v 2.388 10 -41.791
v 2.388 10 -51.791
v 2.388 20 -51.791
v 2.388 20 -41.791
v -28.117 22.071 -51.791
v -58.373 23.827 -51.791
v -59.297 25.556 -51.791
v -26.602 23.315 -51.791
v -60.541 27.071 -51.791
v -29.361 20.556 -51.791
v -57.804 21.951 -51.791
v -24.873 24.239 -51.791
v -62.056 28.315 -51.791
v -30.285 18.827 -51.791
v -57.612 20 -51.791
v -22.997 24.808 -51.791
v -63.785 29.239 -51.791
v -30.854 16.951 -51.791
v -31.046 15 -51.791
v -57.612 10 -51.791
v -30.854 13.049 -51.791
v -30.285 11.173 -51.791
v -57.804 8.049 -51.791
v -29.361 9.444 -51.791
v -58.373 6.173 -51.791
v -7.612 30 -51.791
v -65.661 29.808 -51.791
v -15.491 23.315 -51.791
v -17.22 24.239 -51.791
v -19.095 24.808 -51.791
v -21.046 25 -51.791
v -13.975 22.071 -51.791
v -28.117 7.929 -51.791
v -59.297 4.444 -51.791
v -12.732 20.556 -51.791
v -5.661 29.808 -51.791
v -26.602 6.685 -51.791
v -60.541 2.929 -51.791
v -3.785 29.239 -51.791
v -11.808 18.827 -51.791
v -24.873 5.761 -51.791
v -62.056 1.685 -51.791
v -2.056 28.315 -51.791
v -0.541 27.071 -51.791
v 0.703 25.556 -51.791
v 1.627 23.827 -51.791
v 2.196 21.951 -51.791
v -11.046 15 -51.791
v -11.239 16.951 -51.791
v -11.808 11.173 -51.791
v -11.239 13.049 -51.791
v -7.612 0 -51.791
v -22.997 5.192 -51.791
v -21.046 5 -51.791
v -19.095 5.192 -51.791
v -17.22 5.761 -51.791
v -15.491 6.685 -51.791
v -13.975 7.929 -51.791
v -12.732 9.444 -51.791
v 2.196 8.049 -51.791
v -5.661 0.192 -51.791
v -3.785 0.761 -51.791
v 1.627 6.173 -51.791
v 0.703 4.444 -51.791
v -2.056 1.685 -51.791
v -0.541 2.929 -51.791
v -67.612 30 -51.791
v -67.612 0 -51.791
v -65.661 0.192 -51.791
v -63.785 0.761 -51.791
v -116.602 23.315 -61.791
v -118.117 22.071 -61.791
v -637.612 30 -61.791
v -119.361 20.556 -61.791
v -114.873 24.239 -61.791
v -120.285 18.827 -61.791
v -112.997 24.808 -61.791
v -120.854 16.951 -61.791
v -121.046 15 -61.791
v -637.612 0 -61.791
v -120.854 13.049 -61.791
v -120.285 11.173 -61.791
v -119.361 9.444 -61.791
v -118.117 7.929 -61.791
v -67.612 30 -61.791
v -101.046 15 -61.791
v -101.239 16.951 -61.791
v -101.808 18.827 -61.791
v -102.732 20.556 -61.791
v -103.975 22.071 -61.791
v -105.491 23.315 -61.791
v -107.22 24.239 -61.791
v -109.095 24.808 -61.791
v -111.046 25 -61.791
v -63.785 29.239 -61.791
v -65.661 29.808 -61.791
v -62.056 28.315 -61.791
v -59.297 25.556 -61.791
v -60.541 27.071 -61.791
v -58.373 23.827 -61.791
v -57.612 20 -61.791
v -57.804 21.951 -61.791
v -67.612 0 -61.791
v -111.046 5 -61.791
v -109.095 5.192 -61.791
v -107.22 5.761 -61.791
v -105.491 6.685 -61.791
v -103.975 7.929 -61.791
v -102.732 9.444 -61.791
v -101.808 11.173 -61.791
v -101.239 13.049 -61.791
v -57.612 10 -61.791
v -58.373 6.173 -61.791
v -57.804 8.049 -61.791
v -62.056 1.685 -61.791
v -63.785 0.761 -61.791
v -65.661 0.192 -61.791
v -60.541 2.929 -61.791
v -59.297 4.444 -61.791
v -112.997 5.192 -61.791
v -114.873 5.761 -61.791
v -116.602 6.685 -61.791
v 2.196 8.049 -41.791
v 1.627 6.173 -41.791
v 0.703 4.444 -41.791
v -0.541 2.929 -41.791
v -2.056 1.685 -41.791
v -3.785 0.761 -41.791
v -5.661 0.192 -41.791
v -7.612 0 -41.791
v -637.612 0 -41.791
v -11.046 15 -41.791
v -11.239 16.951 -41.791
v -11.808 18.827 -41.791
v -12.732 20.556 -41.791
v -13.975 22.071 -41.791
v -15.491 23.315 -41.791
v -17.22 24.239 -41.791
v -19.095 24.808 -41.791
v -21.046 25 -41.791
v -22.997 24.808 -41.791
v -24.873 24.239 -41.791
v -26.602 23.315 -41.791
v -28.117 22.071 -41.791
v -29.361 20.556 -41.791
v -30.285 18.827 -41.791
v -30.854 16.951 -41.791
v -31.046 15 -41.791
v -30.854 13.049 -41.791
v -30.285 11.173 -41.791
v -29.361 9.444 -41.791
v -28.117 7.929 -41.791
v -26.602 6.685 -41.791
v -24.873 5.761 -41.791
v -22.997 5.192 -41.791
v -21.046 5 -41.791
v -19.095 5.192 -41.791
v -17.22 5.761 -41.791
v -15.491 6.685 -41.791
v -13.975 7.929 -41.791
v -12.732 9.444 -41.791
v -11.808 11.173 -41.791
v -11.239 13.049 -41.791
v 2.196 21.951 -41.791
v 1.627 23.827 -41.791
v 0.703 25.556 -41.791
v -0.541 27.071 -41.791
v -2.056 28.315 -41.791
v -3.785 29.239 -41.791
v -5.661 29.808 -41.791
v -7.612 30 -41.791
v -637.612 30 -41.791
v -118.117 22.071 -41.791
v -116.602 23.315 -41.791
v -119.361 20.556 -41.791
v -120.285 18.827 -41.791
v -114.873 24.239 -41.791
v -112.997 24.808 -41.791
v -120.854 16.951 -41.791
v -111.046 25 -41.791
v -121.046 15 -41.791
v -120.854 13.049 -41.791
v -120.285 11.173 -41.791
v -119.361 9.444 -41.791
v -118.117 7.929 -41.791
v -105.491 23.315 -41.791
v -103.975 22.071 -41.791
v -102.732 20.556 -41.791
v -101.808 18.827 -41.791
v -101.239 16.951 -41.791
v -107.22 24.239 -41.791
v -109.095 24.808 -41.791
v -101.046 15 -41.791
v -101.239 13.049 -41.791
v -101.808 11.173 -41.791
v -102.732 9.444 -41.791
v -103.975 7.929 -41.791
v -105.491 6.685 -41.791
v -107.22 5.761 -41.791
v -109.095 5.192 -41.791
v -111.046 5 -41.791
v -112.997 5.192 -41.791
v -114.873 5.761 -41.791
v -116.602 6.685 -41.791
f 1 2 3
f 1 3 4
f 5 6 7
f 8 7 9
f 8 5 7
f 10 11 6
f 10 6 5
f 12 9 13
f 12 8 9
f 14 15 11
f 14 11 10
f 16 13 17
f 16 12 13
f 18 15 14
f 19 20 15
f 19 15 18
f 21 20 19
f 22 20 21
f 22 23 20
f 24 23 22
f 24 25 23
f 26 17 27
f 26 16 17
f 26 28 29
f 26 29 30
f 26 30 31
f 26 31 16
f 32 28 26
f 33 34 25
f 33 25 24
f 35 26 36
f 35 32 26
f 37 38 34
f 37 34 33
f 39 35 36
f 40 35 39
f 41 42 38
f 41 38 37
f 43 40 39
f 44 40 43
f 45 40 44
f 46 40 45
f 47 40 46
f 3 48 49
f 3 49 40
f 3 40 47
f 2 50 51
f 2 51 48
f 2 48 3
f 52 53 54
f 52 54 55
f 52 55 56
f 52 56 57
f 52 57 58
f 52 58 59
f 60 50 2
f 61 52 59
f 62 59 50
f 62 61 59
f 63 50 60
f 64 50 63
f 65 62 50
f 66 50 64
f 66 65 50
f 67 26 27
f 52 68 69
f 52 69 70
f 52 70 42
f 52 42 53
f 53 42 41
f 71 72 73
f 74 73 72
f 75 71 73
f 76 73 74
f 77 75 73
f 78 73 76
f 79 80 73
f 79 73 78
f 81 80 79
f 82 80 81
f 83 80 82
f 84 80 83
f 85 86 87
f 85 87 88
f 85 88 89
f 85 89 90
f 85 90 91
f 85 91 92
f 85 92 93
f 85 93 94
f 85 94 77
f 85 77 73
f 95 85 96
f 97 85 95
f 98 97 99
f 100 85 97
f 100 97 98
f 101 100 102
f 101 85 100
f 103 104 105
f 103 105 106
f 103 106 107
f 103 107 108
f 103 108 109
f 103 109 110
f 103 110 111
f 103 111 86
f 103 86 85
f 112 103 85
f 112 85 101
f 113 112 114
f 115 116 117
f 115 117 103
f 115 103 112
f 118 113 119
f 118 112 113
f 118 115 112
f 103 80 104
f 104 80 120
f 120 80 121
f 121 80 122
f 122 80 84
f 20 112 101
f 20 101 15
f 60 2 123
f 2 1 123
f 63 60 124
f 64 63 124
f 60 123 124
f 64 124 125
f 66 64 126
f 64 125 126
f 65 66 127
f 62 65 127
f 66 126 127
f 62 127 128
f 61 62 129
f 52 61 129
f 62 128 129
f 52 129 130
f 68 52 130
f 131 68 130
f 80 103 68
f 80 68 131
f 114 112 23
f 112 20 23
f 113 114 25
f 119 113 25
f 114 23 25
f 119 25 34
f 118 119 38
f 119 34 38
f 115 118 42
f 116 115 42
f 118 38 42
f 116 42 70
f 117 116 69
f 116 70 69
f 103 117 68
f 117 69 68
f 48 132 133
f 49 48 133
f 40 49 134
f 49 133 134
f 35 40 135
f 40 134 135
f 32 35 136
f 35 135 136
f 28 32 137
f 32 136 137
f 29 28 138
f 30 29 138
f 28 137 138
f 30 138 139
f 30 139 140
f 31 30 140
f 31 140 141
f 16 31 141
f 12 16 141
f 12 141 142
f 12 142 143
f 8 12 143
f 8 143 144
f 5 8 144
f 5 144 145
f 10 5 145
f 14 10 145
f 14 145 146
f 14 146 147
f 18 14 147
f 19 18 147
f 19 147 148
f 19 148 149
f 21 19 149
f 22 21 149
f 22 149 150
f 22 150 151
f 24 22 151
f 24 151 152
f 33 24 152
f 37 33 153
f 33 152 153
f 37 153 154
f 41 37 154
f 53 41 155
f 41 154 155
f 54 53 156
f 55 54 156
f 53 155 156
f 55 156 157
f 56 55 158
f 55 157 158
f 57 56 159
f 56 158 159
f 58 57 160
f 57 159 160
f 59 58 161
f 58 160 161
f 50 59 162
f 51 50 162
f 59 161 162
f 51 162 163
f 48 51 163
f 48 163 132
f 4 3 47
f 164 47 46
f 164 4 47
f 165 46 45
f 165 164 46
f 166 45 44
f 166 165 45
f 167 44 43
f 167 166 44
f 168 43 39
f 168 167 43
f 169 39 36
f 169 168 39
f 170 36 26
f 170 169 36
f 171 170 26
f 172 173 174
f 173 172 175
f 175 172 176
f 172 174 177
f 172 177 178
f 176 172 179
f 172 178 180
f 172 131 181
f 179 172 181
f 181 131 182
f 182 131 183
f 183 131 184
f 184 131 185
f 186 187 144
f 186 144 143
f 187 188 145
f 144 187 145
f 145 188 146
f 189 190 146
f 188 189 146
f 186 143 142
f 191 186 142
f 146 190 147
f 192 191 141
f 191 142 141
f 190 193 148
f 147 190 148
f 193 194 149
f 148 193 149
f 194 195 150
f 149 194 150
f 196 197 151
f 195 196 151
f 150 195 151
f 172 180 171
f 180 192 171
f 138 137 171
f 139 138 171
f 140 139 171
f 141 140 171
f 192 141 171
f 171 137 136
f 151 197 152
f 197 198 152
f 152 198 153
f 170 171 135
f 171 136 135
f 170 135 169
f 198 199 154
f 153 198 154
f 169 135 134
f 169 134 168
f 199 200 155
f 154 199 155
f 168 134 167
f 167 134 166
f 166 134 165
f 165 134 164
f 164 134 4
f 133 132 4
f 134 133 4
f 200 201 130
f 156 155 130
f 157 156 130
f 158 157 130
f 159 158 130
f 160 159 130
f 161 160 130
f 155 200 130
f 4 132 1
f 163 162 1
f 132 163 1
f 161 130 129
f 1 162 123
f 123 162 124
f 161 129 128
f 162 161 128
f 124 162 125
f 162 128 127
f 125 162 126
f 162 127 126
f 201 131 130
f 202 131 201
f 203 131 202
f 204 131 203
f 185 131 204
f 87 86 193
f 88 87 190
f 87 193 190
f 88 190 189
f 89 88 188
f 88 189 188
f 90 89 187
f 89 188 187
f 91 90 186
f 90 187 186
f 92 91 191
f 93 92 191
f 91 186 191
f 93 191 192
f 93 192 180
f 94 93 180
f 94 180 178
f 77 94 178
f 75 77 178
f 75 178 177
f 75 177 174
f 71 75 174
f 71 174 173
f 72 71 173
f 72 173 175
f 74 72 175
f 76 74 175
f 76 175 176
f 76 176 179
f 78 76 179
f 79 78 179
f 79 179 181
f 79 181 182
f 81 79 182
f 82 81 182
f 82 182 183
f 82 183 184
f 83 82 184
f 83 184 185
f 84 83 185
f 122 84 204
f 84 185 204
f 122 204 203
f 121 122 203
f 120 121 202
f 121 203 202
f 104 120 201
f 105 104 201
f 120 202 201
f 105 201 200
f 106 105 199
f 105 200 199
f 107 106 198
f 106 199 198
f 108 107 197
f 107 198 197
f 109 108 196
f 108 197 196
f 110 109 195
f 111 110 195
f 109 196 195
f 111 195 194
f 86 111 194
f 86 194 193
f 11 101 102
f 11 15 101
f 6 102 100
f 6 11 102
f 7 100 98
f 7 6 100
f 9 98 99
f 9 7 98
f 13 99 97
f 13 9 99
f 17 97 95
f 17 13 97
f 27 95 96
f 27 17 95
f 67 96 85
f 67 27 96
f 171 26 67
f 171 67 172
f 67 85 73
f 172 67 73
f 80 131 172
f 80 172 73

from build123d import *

# Parameters (mm, degrees)
BOSS_EXTRUDE1_DEPTH = 30
FILLET1_R           = 10
SKETCH2_R           = 10
CUT_EXTRUDE1_DEPTH  = 639.630555495


with BuildPart() as part:
    # Sketch1 → Boss-Extrude1 (new body)
    with BuildSketch(Plane(origin=(0, 0, 0), x_dir=(1, 0, 0), z_dir=(0, 1, 0))):
        Polygon((-637.611940299, 61.791044776), (-57.611940299, 61.791044776), (-57.611940299, 51.791044776), (2.388059701, 51.791044776), (2.388059701, 41.791044776), (-17.611940299, 41.791044776), (-637.611940299, 41.791044776), align=None)
    extrude(amount=BOSS_EXTRUDE1_DEPTH)

    # Fillet1
    fillet1_edges = [part.edges().sort_by_distance(p)[0] for p in [
        (2.388059701, 30, -46.791044776),
        (-57.611940299, 30, -56.791044776),
        (-57.611940299, 0, -56.791044776),
        (2.388059701, 0, -46.791044776),
    ]]
    fillet(fillet1_edges, radius=FILLET1_R)

    # Sketch2 → Cut-Extrude1 (cut, through all)
    with BuildSketch(Plane.XY.offset(-41.791044776)):
        with Locations((-21.046360359, 15)):
            Circle(SKETCH2_R)
        with Locations((-111.046360359, 15)):
            Circle(SKETCH2_R)
    extrude(amount=-CUT_EXTRUDE1_DEPTH, mode=Mode.SUBTRACT)


solid = part.part
